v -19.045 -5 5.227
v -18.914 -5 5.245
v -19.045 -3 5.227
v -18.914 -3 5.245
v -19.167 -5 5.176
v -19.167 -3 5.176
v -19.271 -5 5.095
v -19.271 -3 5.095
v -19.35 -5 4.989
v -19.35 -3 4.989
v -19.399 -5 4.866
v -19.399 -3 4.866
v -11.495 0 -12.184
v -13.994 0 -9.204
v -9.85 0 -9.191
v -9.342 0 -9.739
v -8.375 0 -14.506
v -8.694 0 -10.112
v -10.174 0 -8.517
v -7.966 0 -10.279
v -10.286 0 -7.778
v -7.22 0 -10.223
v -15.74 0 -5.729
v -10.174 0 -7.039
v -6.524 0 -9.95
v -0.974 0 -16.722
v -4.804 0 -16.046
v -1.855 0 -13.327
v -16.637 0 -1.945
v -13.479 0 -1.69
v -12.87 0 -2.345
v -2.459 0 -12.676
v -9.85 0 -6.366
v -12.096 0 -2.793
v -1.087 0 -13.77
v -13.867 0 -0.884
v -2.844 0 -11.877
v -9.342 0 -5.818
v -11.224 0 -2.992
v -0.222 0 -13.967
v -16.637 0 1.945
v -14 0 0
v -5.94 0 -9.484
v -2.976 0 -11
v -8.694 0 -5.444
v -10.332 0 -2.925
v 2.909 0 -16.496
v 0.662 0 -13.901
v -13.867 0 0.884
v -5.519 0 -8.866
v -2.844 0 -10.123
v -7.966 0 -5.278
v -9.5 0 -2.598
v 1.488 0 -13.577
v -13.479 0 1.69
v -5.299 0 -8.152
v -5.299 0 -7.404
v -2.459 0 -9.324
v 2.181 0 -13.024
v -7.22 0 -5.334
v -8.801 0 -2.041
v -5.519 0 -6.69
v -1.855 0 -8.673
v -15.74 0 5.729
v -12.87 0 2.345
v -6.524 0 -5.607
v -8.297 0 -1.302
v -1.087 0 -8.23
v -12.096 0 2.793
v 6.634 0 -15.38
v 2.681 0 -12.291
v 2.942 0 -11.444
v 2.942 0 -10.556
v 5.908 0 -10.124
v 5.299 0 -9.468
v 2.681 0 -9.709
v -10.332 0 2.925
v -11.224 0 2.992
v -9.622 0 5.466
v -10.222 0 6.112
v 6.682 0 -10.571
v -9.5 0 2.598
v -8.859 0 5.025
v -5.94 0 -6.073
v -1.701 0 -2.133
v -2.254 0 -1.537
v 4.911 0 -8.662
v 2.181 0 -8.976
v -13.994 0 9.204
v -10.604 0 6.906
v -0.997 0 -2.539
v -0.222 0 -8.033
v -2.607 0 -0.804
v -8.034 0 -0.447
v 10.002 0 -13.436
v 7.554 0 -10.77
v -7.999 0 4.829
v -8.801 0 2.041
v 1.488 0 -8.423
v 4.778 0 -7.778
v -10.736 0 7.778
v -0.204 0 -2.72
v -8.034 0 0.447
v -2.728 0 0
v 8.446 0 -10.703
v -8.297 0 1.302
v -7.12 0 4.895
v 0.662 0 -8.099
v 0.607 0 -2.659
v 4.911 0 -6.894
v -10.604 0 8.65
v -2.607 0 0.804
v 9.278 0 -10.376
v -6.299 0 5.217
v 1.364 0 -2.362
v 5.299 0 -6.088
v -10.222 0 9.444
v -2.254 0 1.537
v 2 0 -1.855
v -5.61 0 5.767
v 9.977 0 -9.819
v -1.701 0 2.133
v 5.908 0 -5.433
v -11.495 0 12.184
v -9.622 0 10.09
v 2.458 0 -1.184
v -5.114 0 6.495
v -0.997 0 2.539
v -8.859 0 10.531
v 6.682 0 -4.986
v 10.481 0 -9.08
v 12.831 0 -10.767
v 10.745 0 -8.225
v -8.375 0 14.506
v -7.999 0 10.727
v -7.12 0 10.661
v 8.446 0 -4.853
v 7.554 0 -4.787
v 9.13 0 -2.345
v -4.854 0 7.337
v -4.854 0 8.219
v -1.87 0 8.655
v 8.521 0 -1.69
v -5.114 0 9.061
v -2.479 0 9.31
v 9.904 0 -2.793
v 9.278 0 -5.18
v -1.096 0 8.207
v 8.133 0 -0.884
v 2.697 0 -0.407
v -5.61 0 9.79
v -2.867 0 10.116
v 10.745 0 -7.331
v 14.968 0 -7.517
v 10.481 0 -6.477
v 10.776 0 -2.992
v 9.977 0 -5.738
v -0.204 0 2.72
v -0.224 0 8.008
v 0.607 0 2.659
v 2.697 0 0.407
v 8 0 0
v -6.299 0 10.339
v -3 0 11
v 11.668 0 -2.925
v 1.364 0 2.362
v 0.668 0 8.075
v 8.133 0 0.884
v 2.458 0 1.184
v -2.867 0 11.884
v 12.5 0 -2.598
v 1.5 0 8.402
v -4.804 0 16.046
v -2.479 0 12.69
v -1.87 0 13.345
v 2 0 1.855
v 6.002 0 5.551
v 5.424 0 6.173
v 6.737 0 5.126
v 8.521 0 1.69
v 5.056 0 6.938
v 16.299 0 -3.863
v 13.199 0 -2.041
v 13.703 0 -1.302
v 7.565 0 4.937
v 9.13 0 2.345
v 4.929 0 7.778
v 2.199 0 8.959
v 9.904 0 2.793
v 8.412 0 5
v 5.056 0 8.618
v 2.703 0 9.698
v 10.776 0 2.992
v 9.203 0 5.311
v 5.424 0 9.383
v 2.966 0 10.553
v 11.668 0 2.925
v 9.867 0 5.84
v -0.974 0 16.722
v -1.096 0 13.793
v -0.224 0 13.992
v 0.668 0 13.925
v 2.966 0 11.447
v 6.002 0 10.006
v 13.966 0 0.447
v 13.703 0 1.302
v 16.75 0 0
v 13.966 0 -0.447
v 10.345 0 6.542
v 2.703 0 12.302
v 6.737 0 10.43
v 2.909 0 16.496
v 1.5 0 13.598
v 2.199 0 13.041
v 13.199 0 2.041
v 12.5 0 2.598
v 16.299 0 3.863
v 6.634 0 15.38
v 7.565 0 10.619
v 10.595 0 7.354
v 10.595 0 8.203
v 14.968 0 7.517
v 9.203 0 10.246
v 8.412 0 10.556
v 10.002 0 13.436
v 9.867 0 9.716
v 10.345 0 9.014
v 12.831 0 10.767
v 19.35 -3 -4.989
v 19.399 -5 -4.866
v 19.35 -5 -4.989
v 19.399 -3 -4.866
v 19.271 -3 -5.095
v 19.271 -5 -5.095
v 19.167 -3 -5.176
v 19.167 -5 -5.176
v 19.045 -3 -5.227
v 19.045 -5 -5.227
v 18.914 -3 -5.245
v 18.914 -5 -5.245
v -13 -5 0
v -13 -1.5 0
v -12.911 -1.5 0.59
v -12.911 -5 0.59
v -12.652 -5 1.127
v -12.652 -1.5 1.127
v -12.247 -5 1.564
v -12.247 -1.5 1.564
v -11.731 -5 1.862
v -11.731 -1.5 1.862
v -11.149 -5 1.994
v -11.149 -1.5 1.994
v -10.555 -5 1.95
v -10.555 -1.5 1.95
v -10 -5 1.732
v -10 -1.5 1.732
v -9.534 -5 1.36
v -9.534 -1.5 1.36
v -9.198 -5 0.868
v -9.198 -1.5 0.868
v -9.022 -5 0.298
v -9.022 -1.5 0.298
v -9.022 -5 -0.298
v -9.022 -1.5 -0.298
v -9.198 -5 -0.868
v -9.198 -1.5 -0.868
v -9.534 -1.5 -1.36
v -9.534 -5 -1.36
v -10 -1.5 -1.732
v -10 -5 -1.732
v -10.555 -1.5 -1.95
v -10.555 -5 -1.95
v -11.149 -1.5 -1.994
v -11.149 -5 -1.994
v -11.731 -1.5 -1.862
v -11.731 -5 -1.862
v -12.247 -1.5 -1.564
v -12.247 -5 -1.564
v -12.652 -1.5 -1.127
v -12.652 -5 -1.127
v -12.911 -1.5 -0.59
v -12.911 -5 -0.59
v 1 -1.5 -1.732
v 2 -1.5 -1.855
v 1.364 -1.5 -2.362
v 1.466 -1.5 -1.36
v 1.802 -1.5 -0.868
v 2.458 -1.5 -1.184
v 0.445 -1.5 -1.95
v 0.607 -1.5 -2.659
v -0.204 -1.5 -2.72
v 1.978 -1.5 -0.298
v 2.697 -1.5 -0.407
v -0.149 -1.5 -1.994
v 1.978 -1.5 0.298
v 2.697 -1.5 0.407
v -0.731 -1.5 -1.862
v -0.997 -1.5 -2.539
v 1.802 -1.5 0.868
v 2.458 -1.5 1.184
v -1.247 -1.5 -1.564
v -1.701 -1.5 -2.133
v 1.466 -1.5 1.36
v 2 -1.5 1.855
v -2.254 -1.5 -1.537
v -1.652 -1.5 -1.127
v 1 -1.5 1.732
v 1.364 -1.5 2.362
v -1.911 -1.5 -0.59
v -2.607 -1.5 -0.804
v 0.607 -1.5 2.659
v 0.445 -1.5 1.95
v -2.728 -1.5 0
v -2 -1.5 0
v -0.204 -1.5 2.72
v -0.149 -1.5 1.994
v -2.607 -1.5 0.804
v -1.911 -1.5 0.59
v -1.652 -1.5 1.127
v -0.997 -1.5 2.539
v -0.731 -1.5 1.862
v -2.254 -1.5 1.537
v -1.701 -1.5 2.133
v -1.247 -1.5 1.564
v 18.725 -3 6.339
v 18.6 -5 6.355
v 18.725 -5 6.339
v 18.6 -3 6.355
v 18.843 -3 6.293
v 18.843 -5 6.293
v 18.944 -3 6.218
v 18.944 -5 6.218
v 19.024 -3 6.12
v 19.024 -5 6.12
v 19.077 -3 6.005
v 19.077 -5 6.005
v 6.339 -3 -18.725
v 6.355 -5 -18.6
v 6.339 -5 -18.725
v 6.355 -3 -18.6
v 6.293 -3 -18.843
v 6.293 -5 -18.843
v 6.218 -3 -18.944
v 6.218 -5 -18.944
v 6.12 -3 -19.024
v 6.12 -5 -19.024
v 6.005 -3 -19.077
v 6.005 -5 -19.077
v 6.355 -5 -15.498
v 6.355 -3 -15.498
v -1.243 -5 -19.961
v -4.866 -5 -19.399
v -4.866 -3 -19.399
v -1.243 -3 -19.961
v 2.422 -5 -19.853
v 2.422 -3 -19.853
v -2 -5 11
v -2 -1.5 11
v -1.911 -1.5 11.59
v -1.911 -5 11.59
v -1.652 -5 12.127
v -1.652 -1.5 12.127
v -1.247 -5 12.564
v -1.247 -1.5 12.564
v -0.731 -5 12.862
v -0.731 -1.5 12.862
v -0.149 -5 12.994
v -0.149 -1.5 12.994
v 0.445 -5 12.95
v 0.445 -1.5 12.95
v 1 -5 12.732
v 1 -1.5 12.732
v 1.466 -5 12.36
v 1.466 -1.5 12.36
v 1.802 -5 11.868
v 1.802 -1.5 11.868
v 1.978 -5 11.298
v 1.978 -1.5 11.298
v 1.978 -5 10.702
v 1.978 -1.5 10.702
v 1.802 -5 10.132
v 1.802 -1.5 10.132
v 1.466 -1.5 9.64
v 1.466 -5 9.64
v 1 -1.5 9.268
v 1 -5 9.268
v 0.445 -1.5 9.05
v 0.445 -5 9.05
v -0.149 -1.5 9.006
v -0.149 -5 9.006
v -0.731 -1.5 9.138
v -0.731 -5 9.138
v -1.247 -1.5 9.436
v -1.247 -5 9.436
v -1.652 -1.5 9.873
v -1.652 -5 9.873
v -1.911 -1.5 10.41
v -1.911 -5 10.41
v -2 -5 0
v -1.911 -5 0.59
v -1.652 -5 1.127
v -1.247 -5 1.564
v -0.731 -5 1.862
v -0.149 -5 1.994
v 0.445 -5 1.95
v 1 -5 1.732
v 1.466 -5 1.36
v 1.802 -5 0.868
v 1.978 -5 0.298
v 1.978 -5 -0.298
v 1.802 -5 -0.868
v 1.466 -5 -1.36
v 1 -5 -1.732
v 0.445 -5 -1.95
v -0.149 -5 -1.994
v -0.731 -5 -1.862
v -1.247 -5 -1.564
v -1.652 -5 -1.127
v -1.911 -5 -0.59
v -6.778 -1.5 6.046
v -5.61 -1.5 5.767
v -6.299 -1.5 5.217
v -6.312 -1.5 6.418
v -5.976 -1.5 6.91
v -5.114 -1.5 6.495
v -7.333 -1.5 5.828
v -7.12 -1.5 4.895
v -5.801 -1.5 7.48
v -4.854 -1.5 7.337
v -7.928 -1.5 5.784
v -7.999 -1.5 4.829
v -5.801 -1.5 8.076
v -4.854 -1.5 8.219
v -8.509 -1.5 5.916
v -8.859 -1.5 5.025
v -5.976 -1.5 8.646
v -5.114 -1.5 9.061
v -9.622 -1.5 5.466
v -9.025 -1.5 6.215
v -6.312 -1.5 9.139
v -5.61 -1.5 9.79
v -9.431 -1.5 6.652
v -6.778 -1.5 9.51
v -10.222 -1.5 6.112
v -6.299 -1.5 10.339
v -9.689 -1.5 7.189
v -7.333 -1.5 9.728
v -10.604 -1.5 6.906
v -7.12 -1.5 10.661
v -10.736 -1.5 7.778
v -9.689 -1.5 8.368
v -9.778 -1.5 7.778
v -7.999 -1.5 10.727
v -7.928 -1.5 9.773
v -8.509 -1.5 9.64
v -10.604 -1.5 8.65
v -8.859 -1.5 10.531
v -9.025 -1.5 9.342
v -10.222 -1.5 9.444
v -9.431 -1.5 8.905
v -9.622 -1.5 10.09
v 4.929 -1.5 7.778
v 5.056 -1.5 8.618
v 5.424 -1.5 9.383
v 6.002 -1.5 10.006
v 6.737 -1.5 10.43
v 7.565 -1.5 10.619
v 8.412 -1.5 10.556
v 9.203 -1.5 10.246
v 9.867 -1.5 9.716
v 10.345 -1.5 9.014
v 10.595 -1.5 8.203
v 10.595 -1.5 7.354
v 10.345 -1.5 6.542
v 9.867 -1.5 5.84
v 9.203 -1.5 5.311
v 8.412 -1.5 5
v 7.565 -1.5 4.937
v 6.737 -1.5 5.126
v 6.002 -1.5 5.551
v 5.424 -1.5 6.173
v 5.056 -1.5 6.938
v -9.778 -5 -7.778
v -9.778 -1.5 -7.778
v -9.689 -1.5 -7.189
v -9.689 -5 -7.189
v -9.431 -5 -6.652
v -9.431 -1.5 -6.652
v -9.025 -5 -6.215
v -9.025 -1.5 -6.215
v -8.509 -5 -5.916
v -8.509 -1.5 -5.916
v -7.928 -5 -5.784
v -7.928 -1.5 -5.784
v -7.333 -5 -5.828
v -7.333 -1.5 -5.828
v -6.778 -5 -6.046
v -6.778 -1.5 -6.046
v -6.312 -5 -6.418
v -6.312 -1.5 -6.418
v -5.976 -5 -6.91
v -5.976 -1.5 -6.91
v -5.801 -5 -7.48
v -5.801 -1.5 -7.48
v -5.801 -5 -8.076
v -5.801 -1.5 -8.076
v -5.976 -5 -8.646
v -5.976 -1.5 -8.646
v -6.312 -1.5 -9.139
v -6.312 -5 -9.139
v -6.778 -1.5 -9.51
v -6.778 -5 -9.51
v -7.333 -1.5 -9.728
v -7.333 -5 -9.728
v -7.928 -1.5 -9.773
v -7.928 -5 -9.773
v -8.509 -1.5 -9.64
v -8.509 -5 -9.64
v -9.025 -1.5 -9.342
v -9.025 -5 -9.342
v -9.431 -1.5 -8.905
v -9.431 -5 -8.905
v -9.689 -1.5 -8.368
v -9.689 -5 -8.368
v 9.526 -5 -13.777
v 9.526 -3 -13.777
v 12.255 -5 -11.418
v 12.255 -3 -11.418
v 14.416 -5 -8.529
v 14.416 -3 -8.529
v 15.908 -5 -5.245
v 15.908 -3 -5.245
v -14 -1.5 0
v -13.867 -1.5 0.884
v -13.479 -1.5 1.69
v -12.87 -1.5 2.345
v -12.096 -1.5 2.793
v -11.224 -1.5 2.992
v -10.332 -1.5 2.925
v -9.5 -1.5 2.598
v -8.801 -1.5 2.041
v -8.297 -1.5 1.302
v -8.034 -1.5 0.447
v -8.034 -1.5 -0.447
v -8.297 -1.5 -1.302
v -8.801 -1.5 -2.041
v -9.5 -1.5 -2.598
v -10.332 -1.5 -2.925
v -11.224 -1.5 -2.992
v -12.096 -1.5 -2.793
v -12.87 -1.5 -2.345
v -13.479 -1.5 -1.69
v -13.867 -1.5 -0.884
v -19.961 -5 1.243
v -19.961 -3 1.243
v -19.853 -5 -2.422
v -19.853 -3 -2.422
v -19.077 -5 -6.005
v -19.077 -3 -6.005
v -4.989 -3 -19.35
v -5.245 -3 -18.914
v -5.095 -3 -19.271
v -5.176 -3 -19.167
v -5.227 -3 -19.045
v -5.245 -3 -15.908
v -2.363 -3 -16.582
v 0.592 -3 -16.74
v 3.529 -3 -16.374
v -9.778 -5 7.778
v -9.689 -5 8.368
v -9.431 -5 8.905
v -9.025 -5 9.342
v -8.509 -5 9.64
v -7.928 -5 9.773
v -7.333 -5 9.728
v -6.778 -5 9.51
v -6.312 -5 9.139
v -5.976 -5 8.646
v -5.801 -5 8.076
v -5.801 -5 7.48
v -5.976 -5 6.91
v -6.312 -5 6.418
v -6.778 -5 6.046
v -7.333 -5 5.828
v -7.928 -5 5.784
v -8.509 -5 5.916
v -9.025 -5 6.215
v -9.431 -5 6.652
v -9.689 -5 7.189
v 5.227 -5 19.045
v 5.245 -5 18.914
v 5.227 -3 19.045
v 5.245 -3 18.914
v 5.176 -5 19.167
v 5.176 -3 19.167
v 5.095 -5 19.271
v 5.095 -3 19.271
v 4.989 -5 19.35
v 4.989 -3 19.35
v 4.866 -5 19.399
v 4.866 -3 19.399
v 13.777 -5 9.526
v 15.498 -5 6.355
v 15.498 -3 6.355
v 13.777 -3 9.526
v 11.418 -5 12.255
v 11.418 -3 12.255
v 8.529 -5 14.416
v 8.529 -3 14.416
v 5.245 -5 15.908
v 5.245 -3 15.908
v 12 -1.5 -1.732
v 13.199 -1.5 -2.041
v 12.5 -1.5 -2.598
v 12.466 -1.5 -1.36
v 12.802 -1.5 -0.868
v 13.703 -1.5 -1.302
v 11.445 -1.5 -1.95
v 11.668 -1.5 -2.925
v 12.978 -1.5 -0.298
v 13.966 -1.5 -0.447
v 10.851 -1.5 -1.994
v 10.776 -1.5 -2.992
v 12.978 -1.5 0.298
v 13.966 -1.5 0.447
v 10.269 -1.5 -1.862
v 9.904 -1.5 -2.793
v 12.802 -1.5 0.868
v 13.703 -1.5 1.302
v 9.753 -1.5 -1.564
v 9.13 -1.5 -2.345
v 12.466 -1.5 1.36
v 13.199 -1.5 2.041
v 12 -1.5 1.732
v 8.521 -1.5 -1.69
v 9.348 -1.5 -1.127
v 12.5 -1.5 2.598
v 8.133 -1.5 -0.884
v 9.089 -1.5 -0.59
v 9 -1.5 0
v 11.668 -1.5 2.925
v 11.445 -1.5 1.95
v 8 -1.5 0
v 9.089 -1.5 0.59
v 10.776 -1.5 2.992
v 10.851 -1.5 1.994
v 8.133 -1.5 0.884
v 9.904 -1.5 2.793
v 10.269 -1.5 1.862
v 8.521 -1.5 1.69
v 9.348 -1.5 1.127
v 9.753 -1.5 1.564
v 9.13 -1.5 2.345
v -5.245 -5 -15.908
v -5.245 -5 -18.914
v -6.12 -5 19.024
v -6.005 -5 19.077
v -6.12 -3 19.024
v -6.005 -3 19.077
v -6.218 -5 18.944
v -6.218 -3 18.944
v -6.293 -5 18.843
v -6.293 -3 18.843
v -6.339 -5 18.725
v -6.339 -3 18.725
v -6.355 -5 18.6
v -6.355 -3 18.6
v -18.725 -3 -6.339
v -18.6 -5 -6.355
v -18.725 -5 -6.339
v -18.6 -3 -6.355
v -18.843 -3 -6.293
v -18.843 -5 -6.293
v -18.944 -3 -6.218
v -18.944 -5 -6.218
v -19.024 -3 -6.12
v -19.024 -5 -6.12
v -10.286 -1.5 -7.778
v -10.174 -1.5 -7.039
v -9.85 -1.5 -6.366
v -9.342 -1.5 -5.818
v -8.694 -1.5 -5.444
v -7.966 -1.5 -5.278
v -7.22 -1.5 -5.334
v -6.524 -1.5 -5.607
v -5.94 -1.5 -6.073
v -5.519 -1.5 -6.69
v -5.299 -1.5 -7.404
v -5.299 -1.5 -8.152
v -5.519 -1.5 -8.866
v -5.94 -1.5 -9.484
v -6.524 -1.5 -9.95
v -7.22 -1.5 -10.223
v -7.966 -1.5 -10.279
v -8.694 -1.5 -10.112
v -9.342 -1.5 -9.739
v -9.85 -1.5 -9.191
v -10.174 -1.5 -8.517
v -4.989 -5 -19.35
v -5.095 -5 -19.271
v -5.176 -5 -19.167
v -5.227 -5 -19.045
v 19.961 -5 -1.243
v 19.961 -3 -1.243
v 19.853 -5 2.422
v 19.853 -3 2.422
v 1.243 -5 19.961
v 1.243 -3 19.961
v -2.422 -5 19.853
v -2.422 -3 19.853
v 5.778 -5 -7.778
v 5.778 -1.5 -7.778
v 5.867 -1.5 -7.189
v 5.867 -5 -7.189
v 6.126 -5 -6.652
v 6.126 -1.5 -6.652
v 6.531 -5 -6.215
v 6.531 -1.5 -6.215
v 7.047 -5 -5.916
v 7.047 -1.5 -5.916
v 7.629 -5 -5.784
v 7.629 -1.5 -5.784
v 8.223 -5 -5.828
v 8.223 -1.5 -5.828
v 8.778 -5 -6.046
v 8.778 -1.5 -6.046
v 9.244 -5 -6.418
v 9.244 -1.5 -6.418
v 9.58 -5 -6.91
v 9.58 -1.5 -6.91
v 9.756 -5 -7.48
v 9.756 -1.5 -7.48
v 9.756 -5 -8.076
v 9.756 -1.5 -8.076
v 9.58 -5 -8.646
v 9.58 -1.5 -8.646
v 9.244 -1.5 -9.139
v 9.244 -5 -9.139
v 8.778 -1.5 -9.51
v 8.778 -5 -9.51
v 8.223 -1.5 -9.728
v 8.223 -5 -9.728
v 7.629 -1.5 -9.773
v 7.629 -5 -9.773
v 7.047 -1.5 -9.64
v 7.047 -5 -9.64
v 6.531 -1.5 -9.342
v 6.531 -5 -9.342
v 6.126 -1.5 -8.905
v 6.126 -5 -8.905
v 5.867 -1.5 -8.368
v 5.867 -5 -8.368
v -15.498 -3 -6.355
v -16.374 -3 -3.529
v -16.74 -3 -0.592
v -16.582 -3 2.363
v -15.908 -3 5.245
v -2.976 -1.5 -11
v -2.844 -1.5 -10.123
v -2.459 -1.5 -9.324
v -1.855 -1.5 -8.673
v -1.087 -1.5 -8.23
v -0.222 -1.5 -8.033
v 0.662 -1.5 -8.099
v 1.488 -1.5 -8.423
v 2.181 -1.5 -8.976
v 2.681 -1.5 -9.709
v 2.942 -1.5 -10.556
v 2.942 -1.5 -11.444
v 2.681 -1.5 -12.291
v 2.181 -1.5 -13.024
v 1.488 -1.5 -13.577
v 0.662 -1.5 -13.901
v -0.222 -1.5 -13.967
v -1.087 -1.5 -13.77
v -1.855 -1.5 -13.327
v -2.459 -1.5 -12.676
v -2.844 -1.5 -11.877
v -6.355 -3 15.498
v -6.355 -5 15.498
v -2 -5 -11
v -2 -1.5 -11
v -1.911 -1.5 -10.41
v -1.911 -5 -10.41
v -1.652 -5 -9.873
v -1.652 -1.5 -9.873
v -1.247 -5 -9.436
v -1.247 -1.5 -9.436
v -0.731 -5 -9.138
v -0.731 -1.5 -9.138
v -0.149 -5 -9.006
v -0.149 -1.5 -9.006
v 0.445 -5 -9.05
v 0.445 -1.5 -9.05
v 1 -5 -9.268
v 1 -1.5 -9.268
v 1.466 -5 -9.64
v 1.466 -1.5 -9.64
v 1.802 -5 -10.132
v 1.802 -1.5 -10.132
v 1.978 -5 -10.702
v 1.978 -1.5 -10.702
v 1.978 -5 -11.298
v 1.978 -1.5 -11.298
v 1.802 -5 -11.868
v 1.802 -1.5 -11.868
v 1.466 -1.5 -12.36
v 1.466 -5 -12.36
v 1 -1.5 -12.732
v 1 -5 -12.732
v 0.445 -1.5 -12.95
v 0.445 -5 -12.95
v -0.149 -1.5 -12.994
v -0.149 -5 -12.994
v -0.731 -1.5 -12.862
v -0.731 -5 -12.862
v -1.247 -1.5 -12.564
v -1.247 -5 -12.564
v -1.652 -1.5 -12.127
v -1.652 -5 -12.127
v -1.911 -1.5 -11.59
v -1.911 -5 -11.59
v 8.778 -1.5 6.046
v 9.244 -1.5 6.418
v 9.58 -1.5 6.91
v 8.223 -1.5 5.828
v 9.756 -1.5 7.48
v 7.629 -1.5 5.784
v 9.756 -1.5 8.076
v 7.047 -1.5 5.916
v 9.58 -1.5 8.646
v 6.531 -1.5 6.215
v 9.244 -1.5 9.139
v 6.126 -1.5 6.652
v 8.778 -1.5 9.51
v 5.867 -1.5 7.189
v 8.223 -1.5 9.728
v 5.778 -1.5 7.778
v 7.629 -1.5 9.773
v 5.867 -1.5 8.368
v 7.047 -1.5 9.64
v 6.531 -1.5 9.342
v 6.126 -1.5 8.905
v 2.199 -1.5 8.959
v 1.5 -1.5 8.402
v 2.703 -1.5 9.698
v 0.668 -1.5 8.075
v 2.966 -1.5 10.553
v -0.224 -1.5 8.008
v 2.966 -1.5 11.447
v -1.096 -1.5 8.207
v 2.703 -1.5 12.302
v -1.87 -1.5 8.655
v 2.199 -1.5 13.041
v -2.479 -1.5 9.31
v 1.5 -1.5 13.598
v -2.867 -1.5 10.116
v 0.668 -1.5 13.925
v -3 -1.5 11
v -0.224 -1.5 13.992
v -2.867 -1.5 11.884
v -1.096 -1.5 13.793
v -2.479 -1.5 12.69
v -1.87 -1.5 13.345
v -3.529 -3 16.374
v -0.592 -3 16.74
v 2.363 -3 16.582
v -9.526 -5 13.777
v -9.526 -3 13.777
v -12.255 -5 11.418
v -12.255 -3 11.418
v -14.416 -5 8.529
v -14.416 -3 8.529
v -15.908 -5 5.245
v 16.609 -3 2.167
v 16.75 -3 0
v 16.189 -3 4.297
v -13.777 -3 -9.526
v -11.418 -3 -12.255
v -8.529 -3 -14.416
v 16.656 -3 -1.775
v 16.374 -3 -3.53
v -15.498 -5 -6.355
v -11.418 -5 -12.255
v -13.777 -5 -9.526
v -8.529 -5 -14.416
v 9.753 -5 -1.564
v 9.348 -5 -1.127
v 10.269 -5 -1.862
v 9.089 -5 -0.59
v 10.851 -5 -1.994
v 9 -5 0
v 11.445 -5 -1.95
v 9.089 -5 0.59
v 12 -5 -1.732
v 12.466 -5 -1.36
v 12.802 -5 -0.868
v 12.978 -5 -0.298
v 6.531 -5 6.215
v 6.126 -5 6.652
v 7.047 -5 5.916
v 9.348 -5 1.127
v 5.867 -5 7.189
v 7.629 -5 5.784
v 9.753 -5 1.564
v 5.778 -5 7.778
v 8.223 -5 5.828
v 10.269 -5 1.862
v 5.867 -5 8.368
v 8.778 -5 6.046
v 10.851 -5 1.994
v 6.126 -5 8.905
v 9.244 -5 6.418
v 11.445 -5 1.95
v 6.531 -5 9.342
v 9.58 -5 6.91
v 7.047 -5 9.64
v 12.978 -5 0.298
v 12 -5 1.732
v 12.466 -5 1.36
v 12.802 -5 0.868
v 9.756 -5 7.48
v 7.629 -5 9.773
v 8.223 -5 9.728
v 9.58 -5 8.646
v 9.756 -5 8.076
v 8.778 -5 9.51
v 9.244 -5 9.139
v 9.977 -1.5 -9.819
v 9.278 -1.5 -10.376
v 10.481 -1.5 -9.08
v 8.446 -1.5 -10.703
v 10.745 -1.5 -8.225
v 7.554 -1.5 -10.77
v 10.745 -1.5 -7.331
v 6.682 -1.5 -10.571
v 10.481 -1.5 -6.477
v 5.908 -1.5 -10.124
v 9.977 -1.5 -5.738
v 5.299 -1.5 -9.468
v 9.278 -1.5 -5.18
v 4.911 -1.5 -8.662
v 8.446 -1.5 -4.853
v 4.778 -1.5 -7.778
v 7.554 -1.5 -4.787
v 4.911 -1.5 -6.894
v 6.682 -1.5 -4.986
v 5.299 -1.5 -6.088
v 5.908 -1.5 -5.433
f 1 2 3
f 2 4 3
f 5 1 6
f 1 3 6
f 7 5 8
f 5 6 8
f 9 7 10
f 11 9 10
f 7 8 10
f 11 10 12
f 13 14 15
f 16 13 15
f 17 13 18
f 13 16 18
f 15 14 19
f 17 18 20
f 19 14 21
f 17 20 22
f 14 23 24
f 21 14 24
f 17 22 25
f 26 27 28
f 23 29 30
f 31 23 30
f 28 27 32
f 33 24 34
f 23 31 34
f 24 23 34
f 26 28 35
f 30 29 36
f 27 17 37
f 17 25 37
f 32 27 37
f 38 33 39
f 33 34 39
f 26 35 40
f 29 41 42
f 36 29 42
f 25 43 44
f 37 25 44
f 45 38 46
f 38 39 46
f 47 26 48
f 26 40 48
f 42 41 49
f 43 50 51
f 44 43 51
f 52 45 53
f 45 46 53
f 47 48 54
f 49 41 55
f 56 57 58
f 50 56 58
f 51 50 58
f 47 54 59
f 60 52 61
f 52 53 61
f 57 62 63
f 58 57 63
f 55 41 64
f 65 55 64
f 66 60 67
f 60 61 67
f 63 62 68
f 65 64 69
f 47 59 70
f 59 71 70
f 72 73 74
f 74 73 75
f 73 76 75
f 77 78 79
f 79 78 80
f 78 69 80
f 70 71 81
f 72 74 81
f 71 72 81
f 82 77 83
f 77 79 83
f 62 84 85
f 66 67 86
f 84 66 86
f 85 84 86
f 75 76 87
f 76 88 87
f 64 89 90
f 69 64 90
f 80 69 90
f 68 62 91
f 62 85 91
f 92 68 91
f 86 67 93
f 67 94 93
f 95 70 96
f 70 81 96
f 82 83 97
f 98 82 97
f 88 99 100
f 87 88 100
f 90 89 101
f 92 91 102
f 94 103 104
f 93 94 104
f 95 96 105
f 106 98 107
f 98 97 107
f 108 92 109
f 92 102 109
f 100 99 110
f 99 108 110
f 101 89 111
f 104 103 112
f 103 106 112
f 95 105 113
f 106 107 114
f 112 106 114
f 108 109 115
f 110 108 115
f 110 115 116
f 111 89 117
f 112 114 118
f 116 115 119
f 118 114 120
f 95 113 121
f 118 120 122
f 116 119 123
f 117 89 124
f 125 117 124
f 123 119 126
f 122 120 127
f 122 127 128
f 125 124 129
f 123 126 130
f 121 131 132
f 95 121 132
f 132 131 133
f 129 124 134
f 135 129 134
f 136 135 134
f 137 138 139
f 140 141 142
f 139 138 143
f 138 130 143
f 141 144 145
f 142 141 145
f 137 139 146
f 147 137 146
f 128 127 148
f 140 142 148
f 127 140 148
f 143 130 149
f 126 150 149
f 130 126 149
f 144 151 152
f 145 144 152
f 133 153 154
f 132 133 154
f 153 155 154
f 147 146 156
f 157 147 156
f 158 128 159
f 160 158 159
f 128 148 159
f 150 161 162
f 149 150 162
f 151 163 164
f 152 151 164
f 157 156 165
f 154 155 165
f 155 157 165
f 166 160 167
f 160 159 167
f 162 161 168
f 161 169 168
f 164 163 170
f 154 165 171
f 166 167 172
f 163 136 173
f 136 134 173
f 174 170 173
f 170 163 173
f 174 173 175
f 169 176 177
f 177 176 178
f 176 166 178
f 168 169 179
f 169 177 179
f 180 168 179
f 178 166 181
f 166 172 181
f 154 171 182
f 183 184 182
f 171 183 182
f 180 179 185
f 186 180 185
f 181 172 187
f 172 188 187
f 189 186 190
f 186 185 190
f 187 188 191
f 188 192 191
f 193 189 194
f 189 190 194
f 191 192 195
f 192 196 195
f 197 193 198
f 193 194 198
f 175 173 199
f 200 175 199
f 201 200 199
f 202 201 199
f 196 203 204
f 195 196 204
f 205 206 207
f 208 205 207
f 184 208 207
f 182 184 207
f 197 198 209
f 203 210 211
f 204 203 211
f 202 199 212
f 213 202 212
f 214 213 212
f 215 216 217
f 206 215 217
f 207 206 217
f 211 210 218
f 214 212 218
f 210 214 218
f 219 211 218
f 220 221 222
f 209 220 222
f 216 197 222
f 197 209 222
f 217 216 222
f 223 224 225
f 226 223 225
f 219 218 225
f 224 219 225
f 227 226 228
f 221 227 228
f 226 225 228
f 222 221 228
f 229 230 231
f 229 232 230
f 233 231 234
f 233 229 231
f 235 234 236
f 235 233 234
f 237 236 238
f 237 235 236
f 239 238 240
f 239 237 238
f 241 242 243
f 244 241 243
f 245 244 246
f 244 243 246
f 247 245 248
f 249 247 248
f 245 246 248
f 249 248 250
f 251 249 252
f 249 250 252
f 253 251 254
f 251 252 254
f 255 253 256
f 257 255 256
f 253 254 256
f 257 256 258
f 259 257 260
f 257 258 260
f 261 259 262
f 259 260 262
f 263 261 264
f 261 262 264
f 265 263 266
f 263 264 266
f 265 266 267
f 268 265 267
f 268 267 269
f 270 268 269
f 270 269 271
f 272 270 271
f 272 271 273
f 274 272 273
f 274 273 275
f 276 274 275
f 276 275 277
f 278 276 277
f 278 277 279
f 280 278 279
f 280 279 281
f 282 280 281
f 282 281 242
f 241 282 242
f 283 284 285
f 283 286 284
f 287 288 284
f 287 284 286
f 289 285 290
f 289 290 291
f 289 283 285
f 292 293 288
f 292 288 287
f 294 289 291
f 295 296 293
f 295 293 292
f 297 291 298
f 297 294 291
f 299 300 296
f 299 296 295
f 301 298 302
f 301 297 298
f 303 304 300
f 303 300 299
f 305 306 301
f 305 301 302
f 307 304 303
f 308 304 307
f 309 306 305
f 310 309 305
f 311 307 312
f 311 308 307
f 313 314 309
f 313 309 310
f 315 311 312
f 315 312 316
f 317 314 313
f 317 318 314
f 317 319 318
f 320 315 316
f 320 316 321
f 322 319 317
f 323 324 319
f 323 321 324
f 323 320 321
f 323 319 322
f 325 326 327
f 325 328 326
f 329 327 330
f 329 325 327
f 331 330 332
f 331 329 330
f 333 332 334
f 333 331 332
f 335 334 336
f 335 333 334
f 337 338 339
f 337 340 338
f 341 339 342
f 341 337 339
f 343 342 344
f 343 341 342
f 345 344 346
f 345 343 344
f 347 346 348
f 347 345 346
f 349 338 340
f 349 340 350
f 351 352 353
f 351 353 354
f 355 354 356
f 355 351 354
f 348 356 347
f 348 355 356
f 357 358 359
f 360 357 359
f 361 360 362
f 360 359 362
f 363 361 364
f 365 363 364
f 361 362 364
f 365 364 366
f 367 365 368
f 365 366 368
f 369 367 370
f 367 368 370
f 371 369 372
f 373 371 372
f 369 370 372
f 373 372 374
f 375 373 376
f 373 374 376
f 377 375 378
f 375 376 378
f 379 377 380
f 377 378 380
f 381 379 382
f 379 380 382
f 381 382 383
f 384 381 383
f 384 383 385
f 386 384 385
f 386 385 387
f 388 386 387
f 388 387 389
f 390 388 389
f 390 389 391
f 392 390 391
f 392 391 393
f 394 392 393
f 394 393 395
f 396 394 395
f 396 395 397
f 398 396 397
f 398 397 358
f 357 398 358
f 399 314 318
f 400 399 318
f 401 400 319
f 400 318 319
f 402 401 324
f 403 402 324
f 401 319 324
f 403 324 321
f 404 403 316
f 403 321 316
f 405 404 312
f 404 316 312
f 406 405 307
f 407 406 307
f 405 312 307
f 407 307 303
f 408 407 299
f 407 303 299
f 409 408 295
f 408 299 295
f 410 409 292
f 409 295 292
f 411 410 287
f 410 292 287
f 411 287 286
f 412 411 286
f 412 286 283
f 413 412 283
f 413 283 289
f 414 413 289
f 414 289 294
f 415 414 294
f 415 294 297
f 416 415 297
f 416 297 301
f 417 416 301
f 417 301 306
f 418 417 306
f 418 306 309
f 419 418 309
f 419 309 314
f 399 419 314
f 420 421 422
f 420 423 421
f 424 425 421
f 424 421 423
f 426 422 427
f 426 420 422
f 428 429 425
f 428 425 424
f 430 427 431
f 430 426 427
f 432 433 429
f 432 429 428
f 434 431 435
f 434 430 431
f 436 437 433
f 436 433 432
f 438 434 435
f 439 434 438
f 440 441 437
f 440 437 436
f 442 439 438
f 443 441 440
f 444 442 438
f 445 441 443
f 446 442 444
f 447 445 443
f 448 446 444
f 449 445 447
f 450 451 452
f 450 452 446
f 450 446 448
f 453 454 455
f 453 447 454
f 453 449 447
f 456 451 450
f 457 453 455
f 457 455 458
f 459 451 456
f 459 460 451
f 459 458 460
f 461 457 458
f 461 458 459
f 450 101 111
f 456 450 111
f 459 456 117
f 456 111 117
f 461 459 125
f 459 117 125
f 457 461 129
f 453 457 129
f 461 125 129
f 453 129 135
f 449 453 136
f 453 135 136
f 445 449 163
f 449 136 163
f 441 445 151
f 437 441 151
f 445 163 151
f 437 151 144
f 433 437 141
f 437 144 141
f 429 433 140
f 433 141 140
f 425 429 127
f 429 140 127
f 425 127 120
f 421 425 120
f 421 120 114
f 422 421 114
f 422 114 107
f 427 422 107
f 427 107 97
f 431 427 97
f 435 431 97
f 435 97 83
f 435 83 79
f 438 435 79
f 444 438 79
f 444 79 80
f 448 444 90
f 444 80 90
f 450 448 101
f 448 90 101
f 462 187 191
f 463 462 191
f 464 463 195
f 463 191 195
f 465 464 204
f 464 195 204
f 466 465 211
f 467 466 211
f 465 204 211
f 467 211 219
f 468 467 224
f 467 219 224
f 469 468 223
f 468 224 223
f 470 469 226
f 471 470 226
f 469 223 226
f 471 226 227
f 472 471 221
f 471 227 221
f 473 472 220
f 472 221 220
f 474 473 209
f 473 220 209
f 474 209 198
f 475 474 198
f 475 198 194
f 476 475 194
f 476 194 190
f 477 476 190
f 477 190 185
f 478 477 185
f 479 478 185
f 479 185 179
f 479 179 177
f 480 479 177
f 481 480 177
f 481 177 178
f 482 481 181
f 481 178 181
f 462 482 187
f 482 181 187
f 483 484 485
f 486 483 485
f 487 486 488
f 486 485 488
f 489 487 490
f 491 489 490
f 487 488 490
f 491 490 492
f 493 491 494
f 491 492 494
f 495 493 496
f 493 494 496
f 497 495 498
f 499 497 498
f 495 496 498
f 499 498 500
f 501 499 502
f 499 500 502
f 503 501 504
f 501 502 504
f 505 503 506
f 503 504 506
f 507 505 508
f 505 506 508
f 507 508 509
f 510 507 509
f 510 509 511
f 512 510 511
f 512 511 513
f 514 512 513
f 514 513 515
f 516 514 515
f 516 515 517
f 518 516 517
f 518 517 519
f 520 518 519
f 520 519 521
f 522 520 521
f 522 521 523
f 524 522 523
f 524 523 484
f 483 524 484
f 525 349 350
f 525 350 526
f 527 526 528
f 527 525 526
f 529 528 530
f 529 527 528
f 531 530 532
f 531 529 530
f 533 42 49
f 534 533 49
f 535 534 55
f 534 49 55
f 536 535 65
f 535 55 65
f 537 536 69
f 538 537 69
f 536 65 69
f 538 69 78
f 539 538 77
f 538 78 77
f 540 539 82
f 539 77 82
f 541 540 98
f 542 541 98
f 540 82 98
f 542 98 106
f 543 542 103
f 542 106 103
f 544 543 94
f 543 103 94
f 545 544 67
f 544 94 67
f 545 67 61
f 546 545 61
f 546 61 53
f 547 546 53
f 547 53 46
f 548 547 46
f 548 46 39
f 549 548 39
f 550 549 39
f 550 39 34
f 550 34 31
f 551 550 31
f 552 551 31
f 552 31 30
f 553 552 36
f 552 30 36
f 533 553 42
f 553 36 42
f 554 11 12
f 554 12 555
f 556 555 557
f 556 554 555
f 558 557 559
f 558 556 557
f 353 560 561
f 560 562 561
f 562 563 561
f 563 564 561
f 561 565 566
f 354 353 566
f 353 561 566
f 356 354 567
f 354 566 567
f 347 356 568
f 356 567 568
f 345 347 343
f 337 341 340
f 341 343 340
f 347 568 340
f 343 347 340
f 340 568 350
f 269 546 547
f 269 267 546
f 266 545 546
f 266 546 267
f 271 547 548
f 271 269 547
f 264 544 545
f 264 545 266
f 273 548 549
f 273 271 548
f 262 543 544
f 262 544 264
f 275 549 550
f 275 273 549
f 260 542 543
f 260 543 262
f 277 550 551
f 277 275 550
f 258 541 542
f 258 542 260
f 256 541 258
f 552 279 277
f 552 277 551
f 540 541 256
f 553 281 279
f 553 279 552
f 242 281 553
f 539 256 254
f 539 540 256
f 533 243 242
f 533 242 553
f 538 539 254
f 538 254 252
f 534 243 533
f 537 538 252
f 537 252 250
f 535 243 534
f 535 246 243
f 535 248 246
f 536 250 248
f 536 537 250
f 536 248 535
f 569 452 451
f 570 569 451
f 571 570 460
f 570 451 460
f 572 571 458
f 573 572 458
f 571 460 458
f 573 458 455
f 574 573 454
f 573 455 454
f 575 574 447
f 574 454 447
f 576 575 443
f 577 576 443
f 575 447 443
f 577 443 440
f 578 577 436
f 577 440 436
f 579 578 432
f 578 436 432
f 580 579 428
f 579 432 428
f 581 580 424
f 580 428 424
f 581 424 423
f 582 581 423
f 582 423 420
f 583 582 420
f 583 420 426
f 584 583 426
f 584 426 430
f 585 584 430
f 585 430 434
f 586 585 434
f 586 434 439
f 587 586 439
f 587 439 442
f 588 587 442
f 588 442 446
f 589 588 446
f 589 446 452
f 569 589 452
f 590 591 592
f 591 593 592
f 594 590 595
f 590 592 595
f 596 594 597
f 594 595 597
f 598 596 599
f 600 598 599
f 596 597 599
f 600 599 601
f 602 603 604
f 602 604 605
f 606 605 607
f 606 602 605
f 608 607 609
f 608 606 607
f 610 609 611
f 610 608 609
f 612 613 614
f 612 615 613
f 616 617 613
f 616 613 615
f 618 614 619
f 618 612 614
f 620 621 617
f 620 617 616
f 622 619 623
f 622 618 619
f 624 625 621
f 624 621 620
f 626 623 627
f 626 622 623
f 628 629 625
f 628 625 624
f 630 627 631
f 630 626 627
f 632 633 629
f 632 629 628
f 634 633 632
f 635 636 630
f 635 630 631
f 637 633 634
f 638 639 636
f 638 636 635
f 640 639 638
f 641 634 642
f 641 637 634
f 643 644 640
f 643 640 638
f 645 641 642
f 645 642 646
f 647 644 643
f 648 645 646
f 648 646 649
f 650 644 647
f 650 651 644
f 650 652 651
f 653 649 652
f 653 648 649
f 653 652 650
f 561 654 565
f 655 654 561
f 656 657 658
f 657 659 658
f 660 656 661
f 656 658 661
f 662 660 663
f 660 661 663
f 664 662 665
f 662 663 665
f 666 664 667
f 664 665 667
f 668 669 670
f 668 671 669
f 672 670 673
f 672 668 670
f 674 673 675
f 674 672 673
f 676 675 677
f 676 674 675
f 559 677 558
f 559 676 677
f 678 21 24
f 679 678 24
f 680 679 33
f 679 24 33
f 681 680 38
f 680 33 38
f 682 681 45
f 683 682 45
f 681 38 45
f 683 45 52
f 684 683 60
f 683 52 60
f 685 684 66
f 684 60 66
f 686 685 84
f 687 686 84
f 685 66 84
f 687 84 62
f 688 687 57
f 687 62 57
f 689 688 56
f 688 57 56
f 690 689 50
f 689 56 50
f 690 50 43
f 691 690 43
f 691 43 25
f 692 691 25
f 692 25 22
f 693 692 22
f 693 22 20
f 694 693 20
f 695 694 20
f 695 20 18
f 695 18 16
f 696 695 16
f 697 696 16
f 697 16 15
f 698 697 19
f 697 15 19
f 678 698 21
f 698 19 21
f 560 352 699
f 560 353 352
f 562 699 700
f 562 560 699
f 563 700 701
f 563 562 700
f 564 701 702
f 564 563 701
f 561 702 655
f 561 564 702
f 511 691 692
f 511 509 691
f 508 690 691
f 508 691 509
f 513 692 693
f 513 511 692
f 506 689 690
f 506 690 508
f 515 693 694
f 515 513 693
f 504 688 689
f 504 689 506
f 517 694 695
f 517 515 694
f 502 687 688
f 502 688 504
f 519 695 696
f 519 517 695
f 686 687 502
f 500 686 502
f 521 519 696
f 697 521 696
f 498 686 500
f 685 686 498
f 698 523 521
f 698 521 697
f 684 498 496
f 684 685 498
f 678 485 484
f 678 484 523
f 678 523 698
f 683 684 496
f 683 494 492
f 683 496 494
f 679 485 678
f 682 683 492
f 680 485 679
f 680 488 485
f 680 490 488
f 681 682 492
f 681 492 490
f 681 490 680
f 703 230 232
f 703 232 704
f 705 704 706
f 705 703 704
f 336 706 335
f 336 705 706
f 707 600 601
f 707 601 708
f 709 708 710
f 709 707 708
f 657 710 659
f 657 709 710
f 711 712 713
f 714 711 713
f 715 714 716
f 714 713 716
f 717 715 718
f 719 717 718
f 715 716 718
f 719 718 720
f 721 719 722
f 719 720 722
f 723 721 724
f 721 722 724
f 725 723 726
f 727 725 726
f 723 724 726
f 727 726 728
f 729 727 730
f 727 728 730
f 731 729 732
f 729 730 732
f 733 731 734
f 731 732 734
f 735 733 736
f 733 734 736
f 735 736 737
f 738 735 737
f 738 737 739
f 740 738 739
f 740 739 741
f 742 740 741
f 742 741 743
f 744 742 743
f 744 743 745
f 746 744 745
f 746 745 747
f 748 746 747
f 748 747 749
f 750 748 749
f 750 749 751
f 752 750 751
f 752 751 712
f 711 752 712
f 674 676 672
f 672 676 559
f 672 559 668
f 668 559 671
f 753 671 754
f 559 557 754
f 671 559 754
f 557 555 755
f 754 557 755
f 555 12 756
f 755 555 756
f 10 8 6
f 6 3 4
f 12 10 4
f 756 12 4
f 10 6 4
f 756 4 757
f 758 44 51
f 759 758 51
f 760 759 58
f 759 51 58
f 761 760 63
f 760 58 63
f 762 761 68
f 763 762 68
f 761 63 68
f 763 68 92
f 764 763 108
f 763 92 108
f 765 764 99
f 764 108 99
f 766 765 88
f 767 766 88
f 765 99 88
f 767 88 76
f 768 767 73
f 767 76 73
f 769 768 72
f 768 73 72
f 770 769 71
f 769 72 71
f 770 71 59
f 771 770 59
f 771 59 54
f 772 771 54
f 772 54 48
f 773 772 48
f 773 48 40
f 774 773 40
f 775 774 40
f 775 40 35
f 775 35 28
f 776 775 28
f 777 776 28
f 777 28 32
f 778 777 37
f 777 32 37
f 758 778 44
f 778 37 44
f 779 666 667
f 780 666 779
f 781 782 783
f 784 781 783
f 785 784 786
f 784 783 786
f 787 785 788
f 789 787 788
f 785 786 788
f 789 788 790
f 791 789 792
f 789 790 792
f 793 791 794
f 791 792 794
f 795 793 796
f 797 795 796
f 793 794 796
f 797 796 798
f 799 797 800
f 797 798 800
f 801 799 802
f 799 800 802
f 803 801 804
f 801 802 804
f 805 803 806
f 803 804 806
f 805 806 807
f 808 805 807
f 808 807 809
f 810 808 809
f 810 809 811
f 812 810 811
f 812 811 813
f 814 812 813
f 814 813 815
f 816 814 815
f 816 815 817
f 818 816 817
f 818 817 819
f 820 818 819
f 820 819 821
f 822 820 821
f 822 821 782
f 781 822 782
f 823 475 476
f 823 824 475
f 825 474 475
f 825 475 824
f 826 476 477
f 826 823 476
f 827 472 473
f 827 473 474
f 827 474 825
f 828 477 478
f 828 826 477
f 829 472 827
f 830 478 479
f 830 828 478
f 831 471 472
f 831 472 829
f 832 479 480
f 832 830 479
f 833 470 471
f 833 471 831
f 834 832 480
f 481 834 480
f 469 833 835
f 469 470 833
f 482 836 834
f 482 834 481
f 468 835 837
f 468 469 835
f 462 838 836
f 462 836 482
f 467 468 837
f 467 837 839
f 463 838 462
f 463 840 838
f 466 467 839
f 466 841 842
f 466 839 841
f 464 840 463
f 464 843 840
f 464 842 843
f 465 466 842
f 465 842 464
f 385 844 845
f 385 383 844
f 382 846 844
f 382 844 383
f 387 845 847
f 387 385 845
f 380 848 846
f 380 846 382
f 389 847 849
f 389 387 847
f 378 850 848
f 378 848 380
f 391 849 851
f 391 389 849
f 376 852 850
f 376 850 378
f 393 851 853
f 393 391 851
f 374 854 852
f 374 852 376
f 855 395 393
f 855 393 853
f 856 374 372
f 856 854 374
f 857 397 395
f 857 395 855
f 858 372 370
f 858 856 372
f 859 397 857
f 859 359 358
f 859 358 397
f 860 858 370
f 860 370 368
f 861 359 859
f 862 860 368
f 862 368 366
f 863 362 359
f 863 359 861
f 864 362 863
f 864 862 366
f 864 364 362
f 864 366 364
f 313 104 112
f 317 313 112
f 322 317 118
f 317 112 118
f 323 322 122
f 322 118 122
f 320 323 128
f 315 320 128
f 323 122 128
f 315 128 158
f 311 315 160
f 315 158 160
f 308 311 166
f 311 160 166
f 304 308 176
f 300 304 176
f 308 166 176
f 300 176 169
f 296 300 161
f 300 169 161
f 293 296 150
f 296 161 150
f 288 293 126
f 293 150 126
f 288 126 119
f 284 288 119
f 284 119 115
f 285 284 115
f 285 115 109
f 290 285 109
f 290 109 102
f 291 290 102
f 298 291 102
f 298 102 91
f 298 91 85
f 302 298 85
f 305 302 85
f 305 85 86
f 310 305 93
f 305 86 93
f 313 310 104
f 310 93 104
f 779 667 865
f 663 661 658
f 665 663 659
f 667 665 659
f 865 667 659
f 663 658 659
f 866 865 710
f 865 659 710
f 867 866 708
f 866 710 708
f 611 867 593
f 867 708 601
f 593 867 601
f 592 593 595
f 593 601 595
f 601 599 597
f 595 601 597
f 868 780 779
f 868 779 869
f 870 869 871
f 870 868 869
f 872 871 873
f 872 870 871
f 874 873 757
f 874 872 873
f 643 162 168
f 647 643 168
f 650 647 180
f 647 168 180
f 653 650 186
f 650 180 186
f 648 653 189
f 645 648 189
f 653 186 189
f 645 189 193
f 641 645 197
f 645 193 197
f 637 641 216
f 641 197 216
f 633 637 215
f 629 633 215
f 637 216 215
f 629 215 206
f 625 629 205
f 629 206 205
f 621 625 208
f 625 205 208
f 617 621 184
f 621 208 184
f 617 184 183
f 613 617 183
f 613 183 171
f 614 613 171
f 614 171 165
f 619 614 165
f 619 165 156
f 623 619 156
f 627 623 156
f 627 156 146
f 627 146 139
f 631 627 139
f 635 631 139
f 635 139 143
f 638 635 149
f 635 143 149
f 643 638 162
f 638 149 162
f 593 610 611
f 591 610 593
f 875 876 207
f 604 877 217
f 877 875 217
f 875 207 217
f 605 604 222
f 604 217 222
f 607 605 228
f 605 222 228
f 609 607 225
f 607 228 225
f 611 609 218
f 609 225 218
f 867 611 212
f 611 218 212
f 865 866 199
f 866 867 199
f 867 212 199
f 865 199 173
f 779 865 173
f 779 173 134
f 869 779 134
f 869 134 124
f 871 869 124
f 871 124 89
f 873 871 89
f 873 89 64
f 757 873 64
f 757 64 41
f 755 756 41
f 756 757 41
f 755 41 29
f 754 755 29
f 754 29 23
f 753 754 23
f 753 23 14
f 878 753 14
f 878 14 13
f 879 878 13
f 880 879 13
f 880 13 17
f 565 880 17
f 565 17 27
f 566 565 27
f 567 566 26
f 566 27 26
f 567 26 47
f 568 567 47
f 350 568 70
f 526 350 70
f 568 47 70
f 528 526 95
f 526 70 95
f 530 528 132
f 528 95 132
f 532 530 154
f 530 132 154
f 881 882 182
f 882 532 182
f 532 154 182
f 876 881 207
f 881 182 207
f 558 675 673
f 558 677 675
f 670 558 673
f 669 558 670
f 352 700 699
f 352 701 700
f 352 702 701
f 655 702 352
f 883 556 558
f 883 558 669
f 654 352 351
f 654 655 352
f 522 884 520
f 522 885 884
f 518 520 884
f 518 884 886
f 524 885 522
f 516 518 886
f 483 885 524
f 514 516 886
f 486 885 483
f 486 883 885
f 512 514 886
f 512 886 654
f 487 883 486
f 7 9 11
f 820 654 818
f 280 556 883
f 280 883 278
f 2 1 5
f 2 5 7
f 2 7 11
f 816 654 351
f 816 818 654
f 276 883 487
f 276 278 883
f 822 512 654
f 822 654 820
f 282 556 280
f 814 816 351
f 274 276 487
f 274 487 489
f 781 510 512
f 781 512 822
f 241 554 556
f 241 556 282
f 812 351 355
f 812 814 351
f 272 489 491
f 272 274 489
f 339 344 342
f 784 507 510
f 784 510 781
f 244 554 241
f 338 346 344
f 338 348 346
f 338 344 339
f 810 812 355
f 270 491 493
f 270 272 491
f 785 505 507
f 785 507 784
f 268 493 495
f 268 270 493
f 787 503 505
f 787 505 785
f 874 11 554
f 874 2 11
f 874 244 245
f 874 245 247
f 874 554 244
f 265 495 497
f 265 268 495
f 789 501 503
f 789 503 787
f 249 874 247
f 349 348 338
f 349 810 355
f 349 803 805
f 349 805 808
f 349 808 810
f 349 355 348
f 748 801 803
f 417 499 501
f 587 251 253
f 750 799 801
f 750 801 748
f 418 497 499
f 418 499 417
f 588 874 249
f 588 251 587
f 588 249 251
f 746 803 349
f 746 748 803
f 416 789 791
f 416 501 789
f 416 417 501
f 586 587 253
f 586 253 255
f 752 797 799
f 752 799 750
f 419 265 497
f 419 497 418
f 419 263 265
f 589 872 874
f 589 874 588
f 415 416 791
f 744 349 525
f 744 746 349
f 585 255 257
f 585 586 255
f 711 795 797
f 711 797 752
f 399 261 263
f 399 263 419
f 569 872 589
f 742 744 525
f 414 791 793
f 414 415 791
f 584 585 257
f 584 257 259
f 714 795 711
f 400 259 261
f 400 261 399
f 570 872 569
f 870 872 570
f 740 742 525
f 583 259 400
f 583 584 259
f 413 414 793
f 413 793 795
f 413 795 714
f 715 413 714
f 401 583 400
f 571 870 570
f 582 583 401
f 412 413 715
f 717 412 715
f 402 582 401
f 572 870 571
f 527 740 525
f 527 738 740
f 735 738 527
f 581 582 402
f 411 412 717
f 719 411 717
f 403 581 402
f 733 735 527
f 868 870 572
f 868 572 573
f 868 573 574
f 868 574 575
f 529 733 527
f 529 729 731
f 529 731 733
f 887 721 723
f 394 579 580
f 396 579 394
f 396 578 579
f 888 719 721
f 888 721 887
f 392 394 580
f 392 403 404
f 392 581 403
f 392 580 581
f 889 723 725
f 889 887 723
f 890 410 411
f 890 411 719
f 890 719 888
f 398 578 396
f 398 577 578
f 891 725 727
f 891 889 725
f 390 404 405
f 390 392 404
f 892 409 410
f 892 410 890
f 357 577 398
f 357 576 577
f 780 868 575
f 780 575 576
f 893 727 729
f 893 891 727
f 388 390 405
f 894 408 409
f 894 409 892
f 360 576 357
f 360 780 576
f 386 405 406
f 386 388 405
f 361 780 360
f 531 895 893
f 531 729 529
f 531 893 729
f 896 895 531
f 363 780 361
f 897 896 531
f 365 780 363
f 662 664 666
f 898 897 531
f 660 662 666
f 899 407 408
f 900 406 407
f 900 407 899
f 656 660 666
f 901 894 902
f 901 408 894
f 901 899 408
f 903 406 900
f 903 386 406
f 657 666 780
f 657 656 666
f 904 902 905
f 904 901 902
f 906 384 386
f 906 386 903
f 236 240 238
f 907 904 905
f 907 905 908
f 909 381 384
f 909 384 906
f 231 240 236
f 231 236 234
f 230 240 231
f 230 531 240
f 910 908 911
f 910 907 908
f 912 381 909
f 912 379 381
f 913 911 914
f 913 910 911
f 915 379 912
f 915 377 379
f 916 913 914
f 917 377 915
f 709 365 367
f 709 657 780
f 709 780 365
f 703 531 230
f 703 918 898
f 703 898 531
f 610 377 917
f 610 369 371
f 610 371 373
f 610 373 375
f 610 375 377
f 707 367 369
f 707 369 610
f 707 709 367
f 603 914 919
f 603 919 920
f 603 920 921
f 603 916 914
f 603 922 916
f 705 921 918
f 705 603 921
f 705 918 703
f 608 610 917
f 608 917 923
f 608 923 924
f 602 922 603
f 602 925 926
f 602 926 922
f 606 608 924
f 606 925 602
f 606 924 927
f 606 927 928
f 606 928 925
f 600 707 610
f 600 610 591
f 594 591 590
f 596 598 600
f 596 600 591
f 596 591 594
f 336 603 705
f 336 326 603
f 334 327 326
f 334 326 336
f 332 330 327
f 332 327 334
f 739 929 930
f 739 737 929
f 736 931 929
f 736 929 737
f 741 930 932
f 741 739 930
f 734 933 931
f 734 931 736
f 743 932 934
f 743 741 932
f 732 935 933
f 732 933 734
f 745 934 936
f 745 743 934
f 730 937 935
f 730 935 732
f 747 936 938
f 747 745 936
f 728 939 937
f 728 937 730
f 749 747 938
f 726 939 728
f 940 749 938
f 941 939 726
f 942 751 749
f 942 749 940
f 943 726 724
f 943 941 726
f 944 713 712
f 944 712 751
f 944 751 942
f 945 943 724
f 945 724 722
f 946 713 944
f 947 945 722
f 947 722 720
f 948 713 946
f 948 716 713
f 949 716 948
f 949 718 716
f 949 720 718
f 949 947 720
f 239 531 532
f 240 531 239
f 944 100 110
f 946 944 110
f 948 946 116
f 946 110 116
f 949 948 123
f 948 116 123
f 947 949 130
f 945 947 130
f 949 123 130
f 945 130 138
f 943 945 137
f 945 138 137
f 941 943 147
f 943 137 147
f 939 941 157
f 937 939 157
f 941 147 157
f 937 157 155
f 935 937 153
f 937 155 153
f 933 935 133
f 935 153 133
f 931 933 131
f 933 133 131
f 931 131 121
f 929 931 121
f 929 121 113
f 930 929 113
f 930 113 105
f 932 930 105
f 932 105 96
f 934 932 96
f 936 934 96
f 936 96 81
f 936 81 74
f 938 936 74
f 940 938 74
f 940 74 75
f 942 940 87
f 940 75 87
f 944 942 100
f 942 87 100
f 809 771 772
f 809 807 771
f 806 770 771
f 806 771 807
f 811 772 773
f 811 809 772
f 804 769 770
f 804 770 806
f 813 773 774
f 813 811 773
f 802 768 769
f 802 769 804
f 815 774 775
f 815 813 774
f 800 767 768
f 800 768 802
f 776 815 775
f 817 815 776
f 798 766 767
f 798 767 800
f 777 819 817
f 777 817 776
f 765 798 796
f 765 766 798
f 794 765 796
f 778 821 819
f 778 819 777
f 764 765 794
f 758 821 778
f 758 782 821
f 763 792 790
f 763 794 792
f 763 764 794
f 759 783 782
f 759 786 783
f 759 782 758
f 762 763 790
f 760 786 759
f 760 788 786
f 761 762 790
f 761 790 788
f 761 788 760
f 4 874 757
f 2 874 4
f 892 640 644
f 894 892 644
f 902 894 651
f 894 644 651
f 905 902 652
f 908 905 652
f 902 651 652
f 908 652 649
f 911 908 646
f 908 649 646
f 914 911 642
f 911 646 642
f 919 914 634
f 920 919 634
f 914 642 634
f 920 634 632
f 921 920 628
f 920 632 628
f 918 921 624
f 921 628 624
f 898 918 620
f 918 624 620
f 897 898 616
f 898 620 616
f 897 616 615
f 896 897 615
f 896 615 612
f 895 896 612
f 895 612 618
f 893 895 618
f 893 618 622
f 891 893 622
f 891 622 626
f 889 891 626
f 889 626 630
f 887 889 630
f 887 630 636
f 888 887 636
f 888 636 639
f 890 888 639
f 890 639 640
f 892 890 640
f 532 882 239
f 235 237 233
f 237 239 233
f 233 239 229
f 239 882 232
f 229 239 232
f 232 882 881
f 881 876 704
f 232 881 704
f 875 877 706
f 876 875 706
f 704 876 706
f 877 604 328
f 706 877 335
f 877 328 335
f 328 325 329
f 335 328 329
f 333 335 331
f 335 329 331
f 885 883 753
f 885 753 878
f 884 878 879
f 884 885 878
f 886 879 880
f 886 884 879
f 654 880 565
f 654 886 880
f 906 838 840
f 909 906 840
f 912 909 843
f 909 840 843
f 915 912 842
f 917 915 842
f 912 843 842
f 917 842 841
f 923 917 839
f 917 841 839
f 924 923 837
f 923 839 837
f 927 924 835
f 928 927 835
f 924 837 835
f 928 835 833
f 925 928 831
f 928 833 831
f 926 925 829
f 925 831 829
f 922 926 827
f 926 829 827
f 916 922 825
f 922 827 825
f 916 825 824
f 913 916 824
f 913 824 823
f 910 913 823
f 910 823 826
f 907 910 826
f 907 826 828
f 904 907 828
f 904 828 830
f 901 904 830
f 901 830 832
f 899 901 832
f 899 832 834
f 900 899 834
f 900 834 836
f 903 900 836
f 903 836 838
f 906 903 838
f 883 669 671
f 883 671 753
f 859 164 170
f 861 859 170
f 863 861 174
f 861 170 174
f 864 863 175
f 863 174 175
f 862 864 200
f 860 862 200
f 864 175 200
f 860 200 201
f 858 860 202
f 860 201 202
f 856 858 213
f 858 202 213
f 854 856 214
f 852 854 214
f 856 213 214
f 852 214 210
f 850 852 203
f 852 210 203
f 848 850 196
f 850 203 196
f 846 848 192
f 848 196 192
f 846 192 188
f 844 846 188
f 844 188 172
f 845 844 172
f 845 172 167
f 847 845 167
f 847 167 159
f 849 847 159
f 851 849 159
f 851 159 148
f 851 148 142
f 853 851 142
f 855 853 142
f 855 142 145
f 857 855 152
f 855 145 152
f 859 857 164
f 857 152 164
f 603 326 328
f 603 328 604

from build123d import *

# Parameters (mm, degrees)
F0_R     = 16.75
F1_DEPTH = 5
F3_DEPTH = 2
F4_R     = 2
F5_DEPTH = 5
F6_R     = 2.8491120017
F6_R_2   = 3
F6_R_3   = 2.9757166717
F6_R_4   = 2.5074273039
F6_R_5   = 2.7276966812
F6_R_6   = 2.9574204399
F7_DEPTH = 1.5
F8_R     = 0.5


with BuildPart() as f1:
    # F0 (on Front) → F1 (new body)
    with BuildSketch(Plane.XZ):
        Circle(F0_R)
    extrude(amount=F1_DEPTH)

    # F2 (on face) → F3 (join)
    with BuildSketch(Plane.XZ.offset(5)):
        with BuildLine():
            Line((5.2447166905, 15.9077165815), (5.2447166905, 19.3000763428))
            ThreePointArc((5.2447166905, 19.3000763428), (-0.5802396301, 19.9915812774), (-6.3552833095, 18.9633956362))
            Line((-6.3552833095, 18.9633956362), (-6.3552833095, 15.4975118666))
            ThreePointArc((-6.3552833095, 15.4975118666), (-0.5919514598, 16.7395368356), (5.2447166905, 15.9077165815))
        make_face()
        with BuildLine():
            ThreePointArc((15.4975118666, 6.3552833095), (11.418067119, 12.2552129017), (5.2447166905, 15.9077165815))
            ThreePointArc((5.2447166905, 15.9077165815), (-0.5919514598, 16.7395368356), (-6.3552833095, 15.4975118666))
            ThreePointArc((-6.3552833095, 15.4975118666), (-12.2552129017, 11.418067119), (-15.9077165815, 5.2447166905))
            ThreePointArc((-15.9077165815, 5.2447166905), (-16.7395368356, -0.5919514598), (-15.4975118666, -6.3552833095))
            ThreePointArc((-15.4975118666, -6.3552833095), (-11.418067119, -12.2552129017), (-5.2447166905, -15.9077165815))
            ThreePointArc((-5.2447166905, -15.9077165815), (0.5919514598, -16.7395368356), (6.3552833095, -15.4975118666))
            ThreePointArc((6.3552833095, -15.4975118666), (12.2552129017, -11.418067119), (15.9077165815, -5.2447166905))
            ThreePointArc((15.9077165815, -5.2447166905), (16.5380886553, -2.6559600205), (16.75, 0))
            ThreePointArc((16.75, 0), (16.4338952133, 3.2387633623), (15.4975118666, 6.3552833095))
        make_face()
        with BuildLine():
            Line((18.9633956362, 6.3552833095), (15.4975118666, 6.3552833095))
            ThreePointArc((15.4975118666, 6.3552833095), (16.4338952133, 3.2387633623), (16.75, 0))
            ThreePointArc((16.75, 0), (16.5380886553, -2.6559600205), (15.9077165815, -5.2447166905))
            Line((15.9077165815, -5.2447166905), (19.3000763428, -5.2447166905))
            ThreePointArc((19.3000763428, -5.2447166905), (19.9915812774, 0.5802396301), (18.9633956362, 6.3552833095))
        make_face()
        with BuildLine():
            ThreePointArc((-15.4975118666, -6.3552833095), (-16.7395368356, -0.5919514598), (-15.9077165815, 5.2447166905))
            Line((-15.9077165815, 5.2447166905), (-19.3000763428, 5.2447166905))
            ThreePointArc((-19.3000763428, 5.2447166905), (-19.9915812774, -0.5802396301), (-18.9633956362, -6.3552833095))
            Line((-18.9633956362, -6.3552833095), (-15.4975118666, -6.3552833095))
        make_face()
        with BuildLine():
            ThreePointArc((6.3552833095, -15.4975118666), (0.5919514598, -16.7395368356), (-5.2447166905, -15.9077165815))
            Line((-5.2447166905, -15.9077165815), (-5.2447166905, -19.3000763428))
            ThreePointArc((-5.2447166905, -19.3000763428), (0.5802396301, -19.9915812774), (6.3552833095, -18.9633956362))
            Line((6.3552833095, -18.9633956362), (6.3552833095, -15.4975118666))
        make_face()
    extrude(amount=-F3_DEPTH)

    # F4 (on face) → F5 (cut, through all)
    with BuildSketch(Plane(origin=(0, 0, 0), x_dir=(-1, 0, 0), z_dir=(0, 1, 0))):
        with Locations((-7.7781745931, 7.7781745931)):
            Circle(F4_R)
        with Locations((-11, 0)):
            Circle(F4_R)
        with Locations((-7.7781745931, -7.7781745931)):
            Circle(F4_R)
        with Locations((0, -11)):
            Circle(F4_R)
        with Locations((7.7781745931, -7.7781745931)):
            Circle(F4_R)
        with Locations((11, 0)):
            Circle(F4_R)
        with Locations((7.7781745931, 7.7781745931)):
            Circle(F4_R)
        Circle(F4_R)
        with Locations((0, 11)):
            Circle(F4_R)
    extrude(amount=-F5_DEPTH, mode=Mode.SUBTRACT)

    # F6 (on face) → F7 (cut)
    with BuildSketch(Plane(origin=(0, 0, 0), x_dir=(-1, 0, 0), z_dir=(0, 1, 0))):
        with Locations((-7.7781745931, 7.7781745931)):
            Circle(F6_R)
        with Locations((-11, 0)):
            Circle(F6_R_2)
        with Locations((-7.7781745931, -7.7781745931)):
            Circle(F6_R_2)
        with Locations((0, -11)):
            Circle(F6_R_3)
        with Locations((7.7781745931, -7.7781745931)):
            Circle(F6_R_4)
        with Locations((11, 0)):
            Circle(F6_R_2)
        Circle(F6_R_5)
        with Locations((7.7781745931, 7.7781745931)):
            Circle(F6_R_6)
        with Locations((0, 11)):
            Circle(F6_R_2)
    extrude(amount=-F7_DEPTH, mode=Mode.SUBTRACT)

    # F8
    f8_edges = [f1.edges().sort_by_distance(p)[0] for p in [
        (5.244717, -4, 19.300076),
        (-6.355283, -4, 18.963396),
        (18.963396, -4, 6.355283),
        (-19.300076, -4, 5.244717),
        (19.300076, -4, -5.244717),
        (-18.963396, -4, -6.355283),
        (6.355283, -4, -18.963396),
        (-5.244717, -4, -19.300076),
    ]]
    fillet(f8_edges, radius=F8_R)


solid = f1.part
